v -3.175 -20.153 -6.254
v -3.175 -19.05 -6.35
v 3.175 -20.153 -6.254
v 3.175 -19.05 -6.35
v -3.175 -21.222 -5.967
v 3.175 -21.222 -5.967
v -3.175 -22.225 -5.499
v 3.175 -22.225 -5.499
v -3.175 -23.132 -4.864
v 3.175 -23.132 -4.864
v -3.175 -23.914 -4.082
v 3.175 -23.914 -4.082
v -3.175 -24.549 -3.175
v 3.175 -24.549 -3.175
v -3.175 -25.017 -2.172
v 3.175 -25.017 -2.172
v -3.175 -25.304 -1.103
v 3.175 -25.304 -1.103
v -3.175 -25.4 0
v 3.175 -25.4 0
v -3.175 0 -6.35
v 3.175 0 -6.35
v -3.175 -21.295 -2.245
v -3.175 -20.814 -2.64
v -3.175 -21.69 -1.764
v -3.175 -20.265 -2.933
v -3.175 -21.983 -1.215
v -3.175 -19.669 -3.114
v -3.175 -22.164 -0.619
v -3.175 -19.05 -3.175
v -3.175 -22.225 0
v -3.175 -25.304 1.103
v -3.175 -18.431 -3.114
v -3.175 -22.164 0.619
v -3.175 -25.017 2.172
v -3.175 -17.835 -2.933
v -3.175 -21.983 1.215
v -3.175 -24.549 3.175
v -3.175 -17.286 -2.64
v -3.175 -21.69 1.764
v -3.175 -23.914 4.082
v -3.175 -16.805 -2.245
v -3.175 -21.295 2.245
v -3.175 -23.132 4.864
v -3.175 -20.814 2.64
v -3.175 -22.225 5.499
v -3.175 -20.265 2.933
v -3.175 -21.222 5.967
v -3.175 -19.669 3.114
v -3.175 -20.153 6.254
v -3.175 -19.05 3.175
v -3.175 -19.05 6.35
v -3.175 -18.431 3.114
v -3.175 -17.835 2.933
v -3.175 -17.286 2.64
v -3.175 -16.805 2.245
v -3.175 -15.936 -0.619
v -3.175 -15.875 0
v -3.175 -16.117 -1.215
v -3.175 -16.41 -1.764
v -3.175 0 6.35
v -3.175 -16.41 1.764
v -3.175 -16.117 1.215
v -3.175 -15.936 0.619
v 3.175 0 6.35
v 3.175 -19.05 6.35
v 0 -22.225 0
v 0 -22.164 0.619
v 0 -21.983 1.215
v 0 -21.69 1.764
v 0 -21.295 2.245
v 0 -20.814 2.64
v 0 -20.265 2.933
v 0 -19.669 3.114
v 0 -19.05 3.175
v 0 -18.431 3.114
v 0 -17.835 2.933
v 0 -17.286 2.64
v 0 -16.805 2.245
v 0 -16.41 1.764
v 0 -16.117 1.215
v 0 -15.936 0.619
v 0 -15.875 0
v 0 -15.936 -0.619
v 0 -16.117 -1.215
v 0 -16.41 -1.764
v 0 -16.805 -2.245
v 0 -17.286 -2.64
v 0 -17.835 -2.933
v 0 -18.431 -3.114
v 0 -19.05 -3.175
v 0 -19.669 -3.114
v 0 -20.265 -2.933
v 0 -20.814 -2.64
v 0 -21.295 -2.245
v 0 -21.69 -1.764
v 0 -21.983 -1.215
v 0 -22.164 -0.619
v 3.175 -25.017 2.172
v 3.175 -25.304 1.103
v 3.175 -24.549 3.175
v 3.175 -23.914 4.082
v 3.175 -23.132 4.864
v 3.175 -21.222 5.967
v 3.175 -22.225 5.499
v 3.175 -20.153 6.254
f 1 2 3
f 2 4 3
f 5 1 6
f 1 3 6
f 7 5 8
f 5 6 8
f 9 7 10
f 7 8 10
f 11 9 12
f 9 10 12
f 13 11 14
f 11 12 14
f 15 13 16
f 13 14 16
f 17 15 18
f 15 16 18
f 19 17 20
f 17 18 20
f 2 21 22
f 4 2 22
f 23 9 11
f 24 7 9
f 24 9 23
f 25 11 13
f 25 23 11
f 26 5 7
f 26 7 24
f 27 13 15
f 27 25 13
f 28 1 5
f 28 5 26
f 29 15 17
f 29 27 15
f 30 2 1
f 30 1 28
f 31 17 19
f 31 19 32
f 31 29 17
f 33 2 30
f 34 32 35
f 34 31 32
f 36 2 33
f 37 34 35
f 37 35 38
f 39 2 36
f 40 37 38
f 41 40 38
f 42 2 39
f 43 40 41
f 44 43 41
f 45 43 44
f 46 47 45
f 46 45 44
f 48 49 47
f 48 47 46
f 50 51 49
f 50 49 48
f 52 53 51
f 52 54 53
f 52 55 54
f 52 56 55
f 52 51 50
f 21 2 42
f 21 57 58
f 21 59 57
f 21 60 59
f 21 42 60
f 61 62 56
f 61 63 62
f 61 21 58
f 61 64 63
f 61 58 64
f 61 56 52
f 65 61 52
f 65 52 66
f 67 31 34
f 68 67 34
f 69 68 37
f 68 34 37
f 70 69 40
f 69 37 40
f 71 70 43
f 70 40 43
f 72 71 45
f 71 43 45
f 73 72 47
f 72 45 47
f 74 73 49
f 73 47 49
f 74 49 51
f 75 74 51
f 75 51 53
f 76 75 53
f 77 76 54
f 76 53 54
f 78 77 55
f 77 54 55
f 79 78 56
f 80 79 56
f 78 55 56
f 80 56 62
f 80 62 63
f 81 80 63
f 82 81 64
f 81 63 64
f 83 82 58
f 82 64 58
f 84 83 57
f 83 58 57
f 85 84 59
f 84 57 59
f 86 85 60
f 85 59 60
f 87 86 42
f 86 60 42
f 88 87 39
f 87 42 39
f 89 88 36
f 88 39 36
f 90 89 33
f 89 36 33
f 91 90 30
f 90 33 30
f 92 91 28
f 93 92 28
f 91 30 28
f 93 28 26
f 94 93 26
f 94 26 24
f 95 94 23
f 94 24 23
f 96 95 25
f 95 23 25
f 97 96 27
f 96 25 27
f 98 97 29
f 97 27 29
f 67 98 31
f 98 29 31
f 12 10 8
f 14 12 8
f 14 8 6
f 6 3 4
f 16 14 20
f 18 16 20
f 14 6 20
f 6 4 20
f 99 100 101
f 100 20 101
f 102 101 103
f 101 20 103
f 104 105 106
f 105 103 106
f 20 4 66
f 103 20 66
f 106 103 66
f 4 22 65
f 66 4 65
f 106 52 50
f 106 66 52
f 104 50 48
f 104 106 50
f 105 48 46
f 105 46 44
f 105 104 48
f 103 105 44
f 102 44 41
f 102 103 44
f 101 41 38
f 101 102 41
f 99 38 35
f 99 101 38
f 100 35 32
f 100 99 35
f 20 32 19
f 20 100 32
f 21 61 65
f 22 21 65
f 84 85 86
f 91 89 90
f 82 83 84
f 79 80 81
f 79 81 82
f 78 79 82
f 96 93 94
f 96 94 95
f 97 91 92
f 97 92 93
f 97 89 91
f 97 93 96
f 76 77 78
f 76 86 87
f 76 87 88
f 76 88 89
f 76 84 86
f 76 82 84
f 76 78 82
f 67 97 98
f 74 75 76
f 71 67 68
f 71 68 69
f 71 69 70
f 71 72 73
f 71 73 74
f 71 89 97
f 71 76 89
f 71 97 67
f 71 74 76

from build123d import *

# Parameters (mm, degrees)
F0_W     = 6.35
F0_H     = 12.7
F1_DEPTH = 25.4
F2_R     = 6.34999
F3_R     = 3.175
F4_DEPTH = 3.175


# Not quite as in the source:
# - a fillet or chamfer is up to 0.001 mm smaller than in the source, because OpenCascade refuses the exact size


with BuildPart() as f1:
    # F0 (on Front) → F1 (new body)
    with BuildSketch(Plane.XZ):
        Rectangle(F0_W, F0_H)
    extrude(amount=F1_DEPTH)

    # F2 (radius 6.35 in the source; OpenCascade refuses exactly that, so slightly less here)
    f2_edges = [f1.edges().sort_by_distance(p)[0] for p in [
        (0, -25.4, 6.35),
        (0, -25.4, -6.35),
    ]]
    fillet(f2_edges, radius=F2_R)

    # F3 (on face) → F4 (cut)
    with BuildSketch(Plane(origin=(-3.175, 0, 0), x_dir=(0, -1, 0), z_dir=(-1, 0, 0))):
        with Locations((19.05, 0)):
            Circle(F3_R)
    extrude(amount=-F4_DEPTH, mode=Mode.SUBTRACT)


solid = f1.part
